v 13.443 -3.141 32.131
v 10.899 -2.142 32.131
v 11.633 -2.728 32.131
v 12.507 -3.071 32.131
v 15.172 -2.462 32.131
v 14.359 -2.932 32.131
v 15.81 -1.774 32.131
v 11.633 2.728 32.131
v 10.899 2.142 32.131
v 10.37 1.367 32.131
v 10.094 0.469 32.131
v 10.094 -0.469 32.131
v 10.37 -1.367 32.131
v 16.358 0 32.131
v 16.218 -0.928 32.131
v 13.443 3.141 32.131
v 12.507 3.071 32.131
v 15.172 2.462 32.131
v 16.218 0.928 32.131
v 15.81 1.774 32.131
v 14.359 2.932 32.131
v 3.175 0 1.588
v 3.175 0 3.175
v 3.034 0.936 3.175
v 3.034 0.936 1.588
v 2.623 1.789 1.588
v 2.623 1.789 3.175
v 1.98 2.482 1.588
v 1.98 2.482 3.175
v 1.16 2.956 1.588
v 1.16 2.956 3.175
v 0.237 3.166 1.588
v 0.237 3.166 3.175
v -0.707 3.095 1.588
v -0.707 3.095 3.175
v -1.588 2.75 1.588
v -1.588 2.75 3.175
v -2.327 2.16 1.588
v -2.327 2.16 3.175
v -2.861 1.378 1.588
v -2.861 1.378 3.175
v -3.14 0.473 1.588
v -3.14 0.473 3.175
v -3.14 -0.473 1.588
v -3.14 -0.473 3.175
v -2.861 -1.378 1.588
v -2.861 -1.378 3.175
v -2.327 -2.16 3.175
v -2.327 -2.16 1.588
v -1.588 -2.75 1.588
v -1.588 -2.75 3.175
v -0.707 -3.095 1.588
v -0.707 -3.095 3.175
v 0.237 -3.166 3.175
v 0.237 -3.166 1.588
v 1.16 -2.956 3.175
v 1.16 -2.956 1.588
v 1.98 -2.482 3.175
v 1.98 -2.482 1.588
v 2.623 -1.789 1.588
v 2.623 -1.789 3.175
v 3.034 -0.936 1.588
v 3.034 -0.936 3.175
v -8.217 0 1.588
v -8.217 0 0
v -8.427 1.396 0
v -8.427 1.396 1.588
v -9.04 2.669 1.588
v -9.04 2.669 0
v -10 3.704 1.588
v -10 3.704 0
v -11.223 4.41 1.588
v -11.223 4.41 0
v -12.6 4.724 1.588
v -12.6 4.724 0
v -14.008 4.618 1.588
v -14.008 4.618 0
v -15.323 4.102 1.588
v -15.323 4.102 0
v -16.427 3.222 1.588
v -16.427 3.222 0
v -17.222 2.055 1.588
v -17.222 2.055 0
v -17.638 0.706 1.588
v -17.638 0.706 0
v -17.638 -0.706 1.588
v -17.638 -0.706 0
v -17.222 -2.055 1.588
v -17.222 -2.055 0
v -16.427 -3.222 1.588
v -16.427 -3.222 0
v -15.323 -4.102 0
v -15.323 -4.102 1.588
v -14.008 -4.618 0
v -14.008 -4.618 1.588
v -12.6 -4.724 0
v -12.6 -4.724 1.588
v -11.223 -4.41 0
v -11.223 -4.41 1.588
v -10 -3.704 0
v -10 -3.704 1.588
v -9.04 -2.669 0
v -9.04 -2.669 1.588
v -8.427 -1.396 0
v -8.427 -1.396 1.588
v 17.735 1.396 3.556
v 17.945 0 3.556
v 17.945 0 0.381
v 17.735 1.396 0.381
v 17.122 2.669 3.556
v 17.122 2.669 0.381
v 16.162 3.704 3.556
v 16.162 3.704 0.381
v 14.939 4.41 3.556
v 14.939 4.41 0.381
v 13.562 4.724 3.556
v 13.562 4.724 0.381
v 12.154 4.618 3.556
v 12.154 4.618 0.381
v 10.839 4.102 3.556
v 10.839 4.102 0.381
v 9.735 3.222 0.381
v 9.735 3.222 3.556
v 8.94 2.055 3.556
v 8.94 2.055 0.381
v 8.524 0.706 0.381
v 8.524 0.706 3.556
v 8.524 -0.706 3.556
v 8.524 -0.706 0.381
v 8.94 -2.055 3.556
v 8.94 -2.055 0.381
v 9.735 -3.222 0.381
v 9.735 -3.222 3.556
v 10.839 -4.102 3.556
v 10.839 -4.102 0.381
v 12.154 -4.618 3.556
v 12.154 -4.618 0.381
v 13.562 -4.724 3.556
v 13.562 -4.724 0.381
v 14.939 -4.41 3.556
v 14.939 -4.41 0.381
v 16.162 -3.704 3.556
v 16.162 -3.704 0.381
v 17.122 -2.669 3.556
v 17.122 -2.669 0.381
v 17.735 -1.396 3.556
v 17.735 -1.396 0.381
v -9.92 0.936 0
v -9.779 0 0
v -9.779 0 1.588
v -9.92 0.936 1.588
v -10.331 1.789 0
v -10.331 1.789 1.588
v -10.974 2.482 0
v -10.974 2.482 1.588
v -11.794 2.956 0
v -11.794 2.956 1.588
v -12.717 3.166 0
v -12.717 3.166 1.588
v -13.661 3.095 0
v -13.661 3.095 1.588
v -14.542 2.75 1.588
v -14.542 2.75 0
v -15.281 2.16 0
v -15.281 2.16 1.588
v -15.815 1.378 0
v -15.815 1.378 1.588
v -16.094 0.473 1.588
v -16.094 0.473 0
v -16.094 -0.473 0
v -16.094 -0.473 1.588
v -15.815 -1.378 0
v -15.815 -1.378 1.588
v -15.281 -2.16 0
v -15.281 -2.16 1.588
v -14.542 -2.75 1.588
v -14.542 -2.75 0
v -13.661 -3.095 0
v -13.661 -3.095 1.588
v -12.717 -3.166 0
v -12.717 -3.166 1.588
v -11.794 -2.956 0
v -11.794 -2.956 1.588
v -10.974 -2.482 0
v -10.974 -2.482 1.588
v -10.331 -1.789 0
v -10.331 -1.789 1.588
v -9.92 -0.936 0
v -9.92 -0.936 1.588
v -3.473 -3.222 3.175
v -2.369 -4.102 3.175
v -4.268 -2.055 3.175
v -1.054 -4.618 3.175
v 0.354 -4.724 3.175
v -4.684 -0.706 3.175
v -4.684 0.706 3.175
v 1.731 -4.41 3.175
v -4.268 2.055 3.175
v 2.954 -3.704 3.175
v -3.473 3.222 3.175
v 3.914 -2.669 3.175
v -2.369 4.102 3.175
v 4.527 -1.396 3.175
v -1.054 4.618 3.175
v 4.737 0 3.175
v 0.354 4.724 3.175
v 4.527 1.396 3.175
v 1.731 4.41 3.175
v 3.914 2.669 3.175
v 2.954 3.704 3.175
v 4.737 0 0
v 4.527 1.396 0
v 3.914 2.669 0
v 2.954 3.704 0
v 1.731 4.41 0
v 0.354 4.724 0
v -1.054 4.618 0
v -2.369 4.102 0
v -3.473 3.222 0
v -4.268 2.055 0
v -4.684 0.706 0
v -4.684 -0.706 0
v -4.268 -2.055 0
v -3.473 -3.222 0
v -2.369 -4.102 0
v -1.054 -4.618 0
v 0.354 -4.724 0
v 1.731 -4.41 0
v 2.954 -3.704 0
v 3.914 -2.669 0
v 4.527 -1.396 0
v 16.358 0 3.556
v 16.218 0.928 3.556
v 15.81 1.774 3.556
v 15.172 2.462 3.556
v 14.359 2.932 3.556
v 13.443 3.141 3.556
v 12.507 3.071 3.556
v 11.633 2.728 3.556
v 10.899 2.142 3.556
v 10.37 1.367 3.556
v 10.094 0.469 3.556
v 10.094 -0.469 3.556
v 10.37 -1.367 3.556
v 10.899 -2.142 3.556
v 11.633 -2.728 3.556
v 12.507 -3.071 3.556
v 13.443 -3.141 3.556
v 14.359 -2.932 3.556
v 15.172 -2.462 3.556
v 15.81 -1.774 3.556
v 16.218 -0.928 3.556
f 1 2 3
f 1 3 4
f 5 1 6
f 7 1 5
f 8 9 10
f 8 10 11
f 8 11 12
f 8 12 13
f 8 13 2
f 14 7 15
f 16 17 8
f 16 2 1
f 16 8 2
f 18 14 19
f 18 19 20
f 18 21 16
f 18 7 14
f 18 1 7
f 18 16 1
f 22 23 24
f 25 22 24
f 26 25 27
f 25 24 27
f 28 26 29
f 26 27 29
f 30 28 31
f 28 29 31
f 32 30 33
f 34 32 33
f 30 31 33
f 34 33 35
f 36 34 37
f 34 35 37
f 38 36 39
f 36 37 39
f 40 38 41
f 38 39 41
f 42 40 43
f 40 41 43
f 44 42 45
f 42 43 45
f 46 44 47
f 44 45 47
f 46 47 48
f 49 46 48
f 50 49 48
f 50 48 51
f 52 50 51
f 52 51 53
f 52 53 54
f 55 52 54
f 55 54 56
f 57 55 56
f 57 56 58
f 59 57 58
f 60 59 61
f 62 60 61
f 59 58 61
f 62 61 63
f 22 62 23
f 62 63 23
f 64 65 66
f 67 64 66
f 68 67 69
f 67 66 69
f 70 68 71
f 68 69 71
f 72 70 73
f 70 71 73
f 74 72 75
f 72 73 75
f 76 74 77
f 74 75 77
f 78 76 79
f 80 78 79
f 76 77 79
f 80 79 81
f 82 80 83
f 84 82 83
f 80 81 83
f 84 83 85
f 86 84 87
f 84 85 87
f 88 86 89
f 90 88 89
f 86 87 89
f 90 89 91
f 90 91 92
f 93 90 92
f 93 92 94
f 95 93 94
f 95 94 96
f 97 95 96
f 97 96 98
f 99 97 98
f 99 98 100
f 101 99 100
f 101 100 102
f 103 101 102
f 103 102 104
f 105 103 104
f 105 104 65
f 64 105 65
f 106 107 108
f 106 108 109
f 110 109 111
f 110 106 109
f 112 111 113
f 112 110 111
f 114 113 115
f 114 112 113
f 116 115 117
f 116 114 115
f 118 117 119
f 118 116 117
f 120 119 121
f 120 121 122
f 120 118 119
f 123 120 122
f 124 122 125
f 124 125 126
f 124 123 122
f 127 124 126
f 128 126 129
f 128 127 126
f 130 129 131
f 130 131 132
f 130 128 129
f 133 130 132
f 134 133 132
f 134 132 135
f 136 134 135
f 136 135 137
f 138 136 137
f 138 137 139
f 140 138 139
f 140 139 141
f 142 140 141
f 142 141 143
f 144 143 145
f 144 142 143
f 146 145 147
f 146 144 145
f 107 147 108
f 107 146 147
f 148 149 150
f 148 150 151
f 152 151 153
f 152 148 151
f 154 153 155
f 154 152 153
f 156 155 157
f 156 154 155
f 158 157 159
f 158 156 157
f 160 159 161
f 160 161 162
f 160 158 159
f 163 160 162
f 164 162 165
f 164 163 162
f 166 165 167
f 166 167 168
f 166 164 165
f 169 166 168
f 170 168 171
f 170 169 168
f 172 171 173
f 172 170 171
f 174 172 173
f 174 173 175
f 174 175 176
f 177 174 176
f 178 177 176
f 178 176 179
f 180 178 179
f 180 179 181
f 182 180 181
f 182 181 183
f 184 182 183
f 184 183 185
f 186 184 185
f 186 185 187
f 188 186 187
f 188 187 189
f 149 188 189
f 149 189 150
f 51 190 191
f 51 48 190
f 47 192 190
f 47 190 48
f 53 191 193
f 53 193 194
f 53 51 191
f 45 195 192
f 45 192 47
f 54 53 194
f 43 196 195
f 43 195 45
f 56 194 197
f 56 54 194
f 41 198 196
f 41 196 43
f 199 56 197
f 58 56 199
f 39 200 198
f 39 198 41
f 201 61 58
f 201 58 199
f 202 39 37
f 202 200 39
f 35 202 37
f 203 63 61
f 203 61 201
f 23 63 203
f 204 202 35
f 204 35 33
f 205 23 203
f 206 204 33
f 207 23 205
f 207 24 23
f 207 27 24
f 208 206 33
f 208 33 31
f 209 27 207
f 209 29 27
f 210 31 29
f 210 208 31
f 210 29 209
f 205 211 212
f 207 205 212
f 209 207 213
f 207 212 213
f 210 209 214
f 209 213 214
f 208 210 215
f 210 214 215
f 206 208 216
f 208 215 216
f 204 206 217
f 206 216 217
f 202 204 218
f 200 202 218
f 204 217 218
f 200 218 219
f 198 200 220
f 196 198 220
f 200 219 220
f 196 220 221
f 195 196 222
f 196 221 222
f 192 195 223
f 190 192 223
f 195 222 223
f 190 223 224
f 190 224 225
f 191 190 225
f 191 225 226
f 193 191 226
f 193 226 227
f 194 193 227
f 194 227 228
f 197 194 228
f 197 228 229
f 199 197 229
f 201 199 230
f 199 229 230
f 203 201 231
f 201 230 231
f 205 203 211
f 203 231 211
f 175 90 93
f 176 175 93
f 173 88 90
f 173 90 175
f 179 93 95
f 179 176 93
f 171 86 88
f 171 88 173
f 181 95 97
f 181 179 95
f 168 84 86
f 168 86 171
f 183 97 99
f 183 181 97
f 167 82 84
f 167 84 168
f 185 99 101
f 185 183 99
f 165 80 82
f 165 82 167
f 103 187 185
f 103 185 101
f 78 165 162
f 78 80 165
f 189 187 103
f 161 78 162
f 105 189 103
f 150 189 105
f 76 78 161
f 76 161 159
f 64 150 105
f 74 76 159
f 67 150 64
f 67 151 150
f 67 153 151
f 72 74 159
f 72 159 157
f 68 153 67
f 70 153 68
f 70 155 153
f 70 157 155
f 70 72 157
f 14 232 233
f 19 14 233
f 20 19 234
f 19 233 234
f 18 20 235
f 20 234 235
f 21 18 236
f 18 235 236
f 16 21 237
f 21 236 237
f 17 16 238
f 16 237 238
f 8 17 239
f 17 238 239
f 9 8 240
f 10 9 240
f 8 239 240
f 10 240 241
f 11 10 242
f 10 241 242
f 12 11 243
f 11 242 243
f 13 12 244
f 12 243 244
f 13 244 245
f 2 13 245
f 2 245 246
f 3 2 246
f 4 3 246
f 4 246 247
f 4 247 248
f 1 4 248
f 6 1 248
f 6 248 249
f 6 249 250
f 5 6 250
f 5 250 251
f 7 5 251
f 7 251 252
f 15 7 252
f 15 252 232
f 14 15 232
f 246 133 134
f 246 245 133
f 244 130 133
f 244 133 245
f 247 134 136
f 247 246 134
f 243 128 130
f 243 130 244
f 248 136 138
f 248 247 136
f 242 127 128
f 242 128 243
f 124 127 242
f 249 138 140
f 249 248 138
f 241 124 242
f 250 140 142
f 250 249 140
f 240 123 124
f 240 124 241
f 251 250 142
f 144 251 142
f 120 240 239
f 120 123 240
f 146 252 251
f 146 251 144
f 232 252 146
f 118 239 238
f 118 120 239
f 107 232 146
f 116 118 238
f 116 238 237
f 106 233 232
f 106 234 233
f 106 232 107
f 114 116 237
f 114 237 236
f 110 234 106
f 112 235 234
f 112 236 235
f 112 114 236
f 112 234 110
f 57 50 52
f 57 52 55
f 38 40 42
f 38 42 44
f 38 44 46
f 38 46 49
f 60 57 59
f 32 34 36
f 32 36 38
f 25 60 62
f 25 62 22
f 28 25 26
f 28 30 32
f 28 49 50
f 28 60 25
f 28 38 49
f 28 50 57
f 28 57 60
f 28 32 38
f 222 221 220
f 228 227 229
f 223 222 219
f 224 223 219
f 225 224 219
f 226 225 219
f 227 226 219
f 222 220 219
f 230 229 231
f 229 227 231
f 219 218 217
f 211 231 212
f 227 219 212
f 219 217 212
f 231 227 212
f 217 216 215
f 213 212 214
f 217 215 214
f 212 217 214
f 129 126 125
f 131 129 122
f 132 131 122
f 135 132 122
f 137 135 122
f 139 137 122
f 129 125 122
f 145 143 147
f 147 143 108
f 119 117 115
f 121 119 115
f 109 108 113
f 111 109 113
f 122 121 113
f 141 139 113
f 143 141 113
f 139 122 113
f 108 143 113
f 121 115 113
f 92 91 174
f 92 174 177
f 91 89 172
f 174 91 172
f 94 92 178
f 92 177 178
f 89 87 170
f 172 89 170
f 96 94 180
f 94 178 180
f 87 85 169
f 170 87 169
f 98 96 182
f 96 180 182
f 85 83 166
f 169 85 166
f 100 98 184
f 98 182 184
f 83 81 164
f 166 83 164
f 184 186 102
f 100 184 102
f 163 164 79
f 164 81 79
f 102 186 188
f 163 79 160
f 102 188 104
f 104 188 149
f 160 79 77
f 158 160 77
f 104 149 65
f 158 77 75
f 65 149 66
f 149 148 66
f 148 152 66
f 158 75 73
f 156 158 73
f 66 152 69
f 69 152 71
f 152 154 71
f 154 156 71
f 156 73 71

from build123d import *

# Parameters (mm, degrees)
F0_R      = 3.1496
F1_DEPTH  = 31.75
F2_R      = 4.7371
F3_DEPTH  = 3.175
F5_R      = 4.7371
F6_DEPTH  = 3.175
F7_R      = 3.175
F8_DEPTH  = 3.175
F10_R     = 4.7371
F11_DEPTH = 3.175
F12_R     = 3.175
F13_DEPTH = 1.5875
F17_DEPTH = 1.5875
F18_DEPTH = 1.5875
F19_R     = 3.175
F20_DEPTH = 1.5875
F21_DEPTH = 3.175


with BuildPart() as f1:
    # F0 (on Top) → F1 (new body)
    with BuildSketch(Plane.XY):
        Circle(F0_R)
    extrude(amount=F1_DEPTH)

    # F2 (on Top) → F3 (join)
    with BuildSketch(Plane.XY):
        Circle(F2_R)
    extrude(amount=-F3_DEPTH)


with BuildPart() as f1_1:
    # F4: moved
    add(f1.part.moved(Location((20.828, 0, 0))))


with BuildPart() as f6:
    # F5 (on Top) → F6 (new body)
    with BuildSketch(Plane.XY):
        Circle(F5_R)
    extrude(amount=F6_DEPTH)

    # F7 (on Top) → F8 (cut)
    with BuildSketch(Plane.XY):
        Circle(F7_R)
    extrude(amount=F8_DEPTH, mode=Mode.SUBTRACT)


with BuildPart() as f6_1:
    # F9: moved
    add(f6.part.moved(Location((0, 21.336, 0))))


with BuildPart() as f11:
    # F10 (on Top) → F11 (new body)
    with BuildSketch(Plane.XY):
        Circle(F10_R)
    extrude(amount=F11_DEPTH)

    # F12 (on Top) → F13 (cut)
    with BuildSketch(Plane.XY):
        Circle(F12_R)
    extrude(amount=F13_DEPTH, mode=Mode.SUBTRACT)

    # F17 (add): a face of the model
    f17_faces = [f11.faces().sort_by_distance(p)[0] for p in [
        (0, 0, 1.5875),
    ]]
    extrude(f17_faces, amount=F17_DEPTH)

    # F19 (on face) → F20 (cut)
    with BuildSketch(Plane.XY.offset(3.175)):
        Circle(F19_R)
    extrude(amount=-F20_DEPTH, mode=Mode.SUBTRACT)


with BuildPart() as f6_2:
    # F14: moved
    add(f6_1.part.moved(Location((-12.954, -21.336, 0))))

    # F18 (cut): a face of the model
    f18_faces = [f6_2.faces().sort_by_distance(p)[0] for p in [
        (-17.5571145787, 0, 3.175),
    ]]
    extrude(f18_faces, amount=-F18_DEPTH, mode=Mode.SUBTRACT)


with BuildPart() as f1_2:
    # F15: moved
    add(f1_1.part.moved(Location((-7.62, 0, 0))))


with BuildPart() as f1_3:
    # F16: moved
    add(f1_2.part.moved(Location((0, 0, 3.556))))

    # F21 (cut): a face of the model
    f21_faces = [f1_3.faces().sort_by_distance(p)[0] for p in [
        (13.208, 0, 35.306),
    ]]
    extrude(f21_faces, amount=-F21_DEPTH, mode=Mode.SUBTRACT)


solid = Compound([f11.part, f6_2.part, f1_3.part])
